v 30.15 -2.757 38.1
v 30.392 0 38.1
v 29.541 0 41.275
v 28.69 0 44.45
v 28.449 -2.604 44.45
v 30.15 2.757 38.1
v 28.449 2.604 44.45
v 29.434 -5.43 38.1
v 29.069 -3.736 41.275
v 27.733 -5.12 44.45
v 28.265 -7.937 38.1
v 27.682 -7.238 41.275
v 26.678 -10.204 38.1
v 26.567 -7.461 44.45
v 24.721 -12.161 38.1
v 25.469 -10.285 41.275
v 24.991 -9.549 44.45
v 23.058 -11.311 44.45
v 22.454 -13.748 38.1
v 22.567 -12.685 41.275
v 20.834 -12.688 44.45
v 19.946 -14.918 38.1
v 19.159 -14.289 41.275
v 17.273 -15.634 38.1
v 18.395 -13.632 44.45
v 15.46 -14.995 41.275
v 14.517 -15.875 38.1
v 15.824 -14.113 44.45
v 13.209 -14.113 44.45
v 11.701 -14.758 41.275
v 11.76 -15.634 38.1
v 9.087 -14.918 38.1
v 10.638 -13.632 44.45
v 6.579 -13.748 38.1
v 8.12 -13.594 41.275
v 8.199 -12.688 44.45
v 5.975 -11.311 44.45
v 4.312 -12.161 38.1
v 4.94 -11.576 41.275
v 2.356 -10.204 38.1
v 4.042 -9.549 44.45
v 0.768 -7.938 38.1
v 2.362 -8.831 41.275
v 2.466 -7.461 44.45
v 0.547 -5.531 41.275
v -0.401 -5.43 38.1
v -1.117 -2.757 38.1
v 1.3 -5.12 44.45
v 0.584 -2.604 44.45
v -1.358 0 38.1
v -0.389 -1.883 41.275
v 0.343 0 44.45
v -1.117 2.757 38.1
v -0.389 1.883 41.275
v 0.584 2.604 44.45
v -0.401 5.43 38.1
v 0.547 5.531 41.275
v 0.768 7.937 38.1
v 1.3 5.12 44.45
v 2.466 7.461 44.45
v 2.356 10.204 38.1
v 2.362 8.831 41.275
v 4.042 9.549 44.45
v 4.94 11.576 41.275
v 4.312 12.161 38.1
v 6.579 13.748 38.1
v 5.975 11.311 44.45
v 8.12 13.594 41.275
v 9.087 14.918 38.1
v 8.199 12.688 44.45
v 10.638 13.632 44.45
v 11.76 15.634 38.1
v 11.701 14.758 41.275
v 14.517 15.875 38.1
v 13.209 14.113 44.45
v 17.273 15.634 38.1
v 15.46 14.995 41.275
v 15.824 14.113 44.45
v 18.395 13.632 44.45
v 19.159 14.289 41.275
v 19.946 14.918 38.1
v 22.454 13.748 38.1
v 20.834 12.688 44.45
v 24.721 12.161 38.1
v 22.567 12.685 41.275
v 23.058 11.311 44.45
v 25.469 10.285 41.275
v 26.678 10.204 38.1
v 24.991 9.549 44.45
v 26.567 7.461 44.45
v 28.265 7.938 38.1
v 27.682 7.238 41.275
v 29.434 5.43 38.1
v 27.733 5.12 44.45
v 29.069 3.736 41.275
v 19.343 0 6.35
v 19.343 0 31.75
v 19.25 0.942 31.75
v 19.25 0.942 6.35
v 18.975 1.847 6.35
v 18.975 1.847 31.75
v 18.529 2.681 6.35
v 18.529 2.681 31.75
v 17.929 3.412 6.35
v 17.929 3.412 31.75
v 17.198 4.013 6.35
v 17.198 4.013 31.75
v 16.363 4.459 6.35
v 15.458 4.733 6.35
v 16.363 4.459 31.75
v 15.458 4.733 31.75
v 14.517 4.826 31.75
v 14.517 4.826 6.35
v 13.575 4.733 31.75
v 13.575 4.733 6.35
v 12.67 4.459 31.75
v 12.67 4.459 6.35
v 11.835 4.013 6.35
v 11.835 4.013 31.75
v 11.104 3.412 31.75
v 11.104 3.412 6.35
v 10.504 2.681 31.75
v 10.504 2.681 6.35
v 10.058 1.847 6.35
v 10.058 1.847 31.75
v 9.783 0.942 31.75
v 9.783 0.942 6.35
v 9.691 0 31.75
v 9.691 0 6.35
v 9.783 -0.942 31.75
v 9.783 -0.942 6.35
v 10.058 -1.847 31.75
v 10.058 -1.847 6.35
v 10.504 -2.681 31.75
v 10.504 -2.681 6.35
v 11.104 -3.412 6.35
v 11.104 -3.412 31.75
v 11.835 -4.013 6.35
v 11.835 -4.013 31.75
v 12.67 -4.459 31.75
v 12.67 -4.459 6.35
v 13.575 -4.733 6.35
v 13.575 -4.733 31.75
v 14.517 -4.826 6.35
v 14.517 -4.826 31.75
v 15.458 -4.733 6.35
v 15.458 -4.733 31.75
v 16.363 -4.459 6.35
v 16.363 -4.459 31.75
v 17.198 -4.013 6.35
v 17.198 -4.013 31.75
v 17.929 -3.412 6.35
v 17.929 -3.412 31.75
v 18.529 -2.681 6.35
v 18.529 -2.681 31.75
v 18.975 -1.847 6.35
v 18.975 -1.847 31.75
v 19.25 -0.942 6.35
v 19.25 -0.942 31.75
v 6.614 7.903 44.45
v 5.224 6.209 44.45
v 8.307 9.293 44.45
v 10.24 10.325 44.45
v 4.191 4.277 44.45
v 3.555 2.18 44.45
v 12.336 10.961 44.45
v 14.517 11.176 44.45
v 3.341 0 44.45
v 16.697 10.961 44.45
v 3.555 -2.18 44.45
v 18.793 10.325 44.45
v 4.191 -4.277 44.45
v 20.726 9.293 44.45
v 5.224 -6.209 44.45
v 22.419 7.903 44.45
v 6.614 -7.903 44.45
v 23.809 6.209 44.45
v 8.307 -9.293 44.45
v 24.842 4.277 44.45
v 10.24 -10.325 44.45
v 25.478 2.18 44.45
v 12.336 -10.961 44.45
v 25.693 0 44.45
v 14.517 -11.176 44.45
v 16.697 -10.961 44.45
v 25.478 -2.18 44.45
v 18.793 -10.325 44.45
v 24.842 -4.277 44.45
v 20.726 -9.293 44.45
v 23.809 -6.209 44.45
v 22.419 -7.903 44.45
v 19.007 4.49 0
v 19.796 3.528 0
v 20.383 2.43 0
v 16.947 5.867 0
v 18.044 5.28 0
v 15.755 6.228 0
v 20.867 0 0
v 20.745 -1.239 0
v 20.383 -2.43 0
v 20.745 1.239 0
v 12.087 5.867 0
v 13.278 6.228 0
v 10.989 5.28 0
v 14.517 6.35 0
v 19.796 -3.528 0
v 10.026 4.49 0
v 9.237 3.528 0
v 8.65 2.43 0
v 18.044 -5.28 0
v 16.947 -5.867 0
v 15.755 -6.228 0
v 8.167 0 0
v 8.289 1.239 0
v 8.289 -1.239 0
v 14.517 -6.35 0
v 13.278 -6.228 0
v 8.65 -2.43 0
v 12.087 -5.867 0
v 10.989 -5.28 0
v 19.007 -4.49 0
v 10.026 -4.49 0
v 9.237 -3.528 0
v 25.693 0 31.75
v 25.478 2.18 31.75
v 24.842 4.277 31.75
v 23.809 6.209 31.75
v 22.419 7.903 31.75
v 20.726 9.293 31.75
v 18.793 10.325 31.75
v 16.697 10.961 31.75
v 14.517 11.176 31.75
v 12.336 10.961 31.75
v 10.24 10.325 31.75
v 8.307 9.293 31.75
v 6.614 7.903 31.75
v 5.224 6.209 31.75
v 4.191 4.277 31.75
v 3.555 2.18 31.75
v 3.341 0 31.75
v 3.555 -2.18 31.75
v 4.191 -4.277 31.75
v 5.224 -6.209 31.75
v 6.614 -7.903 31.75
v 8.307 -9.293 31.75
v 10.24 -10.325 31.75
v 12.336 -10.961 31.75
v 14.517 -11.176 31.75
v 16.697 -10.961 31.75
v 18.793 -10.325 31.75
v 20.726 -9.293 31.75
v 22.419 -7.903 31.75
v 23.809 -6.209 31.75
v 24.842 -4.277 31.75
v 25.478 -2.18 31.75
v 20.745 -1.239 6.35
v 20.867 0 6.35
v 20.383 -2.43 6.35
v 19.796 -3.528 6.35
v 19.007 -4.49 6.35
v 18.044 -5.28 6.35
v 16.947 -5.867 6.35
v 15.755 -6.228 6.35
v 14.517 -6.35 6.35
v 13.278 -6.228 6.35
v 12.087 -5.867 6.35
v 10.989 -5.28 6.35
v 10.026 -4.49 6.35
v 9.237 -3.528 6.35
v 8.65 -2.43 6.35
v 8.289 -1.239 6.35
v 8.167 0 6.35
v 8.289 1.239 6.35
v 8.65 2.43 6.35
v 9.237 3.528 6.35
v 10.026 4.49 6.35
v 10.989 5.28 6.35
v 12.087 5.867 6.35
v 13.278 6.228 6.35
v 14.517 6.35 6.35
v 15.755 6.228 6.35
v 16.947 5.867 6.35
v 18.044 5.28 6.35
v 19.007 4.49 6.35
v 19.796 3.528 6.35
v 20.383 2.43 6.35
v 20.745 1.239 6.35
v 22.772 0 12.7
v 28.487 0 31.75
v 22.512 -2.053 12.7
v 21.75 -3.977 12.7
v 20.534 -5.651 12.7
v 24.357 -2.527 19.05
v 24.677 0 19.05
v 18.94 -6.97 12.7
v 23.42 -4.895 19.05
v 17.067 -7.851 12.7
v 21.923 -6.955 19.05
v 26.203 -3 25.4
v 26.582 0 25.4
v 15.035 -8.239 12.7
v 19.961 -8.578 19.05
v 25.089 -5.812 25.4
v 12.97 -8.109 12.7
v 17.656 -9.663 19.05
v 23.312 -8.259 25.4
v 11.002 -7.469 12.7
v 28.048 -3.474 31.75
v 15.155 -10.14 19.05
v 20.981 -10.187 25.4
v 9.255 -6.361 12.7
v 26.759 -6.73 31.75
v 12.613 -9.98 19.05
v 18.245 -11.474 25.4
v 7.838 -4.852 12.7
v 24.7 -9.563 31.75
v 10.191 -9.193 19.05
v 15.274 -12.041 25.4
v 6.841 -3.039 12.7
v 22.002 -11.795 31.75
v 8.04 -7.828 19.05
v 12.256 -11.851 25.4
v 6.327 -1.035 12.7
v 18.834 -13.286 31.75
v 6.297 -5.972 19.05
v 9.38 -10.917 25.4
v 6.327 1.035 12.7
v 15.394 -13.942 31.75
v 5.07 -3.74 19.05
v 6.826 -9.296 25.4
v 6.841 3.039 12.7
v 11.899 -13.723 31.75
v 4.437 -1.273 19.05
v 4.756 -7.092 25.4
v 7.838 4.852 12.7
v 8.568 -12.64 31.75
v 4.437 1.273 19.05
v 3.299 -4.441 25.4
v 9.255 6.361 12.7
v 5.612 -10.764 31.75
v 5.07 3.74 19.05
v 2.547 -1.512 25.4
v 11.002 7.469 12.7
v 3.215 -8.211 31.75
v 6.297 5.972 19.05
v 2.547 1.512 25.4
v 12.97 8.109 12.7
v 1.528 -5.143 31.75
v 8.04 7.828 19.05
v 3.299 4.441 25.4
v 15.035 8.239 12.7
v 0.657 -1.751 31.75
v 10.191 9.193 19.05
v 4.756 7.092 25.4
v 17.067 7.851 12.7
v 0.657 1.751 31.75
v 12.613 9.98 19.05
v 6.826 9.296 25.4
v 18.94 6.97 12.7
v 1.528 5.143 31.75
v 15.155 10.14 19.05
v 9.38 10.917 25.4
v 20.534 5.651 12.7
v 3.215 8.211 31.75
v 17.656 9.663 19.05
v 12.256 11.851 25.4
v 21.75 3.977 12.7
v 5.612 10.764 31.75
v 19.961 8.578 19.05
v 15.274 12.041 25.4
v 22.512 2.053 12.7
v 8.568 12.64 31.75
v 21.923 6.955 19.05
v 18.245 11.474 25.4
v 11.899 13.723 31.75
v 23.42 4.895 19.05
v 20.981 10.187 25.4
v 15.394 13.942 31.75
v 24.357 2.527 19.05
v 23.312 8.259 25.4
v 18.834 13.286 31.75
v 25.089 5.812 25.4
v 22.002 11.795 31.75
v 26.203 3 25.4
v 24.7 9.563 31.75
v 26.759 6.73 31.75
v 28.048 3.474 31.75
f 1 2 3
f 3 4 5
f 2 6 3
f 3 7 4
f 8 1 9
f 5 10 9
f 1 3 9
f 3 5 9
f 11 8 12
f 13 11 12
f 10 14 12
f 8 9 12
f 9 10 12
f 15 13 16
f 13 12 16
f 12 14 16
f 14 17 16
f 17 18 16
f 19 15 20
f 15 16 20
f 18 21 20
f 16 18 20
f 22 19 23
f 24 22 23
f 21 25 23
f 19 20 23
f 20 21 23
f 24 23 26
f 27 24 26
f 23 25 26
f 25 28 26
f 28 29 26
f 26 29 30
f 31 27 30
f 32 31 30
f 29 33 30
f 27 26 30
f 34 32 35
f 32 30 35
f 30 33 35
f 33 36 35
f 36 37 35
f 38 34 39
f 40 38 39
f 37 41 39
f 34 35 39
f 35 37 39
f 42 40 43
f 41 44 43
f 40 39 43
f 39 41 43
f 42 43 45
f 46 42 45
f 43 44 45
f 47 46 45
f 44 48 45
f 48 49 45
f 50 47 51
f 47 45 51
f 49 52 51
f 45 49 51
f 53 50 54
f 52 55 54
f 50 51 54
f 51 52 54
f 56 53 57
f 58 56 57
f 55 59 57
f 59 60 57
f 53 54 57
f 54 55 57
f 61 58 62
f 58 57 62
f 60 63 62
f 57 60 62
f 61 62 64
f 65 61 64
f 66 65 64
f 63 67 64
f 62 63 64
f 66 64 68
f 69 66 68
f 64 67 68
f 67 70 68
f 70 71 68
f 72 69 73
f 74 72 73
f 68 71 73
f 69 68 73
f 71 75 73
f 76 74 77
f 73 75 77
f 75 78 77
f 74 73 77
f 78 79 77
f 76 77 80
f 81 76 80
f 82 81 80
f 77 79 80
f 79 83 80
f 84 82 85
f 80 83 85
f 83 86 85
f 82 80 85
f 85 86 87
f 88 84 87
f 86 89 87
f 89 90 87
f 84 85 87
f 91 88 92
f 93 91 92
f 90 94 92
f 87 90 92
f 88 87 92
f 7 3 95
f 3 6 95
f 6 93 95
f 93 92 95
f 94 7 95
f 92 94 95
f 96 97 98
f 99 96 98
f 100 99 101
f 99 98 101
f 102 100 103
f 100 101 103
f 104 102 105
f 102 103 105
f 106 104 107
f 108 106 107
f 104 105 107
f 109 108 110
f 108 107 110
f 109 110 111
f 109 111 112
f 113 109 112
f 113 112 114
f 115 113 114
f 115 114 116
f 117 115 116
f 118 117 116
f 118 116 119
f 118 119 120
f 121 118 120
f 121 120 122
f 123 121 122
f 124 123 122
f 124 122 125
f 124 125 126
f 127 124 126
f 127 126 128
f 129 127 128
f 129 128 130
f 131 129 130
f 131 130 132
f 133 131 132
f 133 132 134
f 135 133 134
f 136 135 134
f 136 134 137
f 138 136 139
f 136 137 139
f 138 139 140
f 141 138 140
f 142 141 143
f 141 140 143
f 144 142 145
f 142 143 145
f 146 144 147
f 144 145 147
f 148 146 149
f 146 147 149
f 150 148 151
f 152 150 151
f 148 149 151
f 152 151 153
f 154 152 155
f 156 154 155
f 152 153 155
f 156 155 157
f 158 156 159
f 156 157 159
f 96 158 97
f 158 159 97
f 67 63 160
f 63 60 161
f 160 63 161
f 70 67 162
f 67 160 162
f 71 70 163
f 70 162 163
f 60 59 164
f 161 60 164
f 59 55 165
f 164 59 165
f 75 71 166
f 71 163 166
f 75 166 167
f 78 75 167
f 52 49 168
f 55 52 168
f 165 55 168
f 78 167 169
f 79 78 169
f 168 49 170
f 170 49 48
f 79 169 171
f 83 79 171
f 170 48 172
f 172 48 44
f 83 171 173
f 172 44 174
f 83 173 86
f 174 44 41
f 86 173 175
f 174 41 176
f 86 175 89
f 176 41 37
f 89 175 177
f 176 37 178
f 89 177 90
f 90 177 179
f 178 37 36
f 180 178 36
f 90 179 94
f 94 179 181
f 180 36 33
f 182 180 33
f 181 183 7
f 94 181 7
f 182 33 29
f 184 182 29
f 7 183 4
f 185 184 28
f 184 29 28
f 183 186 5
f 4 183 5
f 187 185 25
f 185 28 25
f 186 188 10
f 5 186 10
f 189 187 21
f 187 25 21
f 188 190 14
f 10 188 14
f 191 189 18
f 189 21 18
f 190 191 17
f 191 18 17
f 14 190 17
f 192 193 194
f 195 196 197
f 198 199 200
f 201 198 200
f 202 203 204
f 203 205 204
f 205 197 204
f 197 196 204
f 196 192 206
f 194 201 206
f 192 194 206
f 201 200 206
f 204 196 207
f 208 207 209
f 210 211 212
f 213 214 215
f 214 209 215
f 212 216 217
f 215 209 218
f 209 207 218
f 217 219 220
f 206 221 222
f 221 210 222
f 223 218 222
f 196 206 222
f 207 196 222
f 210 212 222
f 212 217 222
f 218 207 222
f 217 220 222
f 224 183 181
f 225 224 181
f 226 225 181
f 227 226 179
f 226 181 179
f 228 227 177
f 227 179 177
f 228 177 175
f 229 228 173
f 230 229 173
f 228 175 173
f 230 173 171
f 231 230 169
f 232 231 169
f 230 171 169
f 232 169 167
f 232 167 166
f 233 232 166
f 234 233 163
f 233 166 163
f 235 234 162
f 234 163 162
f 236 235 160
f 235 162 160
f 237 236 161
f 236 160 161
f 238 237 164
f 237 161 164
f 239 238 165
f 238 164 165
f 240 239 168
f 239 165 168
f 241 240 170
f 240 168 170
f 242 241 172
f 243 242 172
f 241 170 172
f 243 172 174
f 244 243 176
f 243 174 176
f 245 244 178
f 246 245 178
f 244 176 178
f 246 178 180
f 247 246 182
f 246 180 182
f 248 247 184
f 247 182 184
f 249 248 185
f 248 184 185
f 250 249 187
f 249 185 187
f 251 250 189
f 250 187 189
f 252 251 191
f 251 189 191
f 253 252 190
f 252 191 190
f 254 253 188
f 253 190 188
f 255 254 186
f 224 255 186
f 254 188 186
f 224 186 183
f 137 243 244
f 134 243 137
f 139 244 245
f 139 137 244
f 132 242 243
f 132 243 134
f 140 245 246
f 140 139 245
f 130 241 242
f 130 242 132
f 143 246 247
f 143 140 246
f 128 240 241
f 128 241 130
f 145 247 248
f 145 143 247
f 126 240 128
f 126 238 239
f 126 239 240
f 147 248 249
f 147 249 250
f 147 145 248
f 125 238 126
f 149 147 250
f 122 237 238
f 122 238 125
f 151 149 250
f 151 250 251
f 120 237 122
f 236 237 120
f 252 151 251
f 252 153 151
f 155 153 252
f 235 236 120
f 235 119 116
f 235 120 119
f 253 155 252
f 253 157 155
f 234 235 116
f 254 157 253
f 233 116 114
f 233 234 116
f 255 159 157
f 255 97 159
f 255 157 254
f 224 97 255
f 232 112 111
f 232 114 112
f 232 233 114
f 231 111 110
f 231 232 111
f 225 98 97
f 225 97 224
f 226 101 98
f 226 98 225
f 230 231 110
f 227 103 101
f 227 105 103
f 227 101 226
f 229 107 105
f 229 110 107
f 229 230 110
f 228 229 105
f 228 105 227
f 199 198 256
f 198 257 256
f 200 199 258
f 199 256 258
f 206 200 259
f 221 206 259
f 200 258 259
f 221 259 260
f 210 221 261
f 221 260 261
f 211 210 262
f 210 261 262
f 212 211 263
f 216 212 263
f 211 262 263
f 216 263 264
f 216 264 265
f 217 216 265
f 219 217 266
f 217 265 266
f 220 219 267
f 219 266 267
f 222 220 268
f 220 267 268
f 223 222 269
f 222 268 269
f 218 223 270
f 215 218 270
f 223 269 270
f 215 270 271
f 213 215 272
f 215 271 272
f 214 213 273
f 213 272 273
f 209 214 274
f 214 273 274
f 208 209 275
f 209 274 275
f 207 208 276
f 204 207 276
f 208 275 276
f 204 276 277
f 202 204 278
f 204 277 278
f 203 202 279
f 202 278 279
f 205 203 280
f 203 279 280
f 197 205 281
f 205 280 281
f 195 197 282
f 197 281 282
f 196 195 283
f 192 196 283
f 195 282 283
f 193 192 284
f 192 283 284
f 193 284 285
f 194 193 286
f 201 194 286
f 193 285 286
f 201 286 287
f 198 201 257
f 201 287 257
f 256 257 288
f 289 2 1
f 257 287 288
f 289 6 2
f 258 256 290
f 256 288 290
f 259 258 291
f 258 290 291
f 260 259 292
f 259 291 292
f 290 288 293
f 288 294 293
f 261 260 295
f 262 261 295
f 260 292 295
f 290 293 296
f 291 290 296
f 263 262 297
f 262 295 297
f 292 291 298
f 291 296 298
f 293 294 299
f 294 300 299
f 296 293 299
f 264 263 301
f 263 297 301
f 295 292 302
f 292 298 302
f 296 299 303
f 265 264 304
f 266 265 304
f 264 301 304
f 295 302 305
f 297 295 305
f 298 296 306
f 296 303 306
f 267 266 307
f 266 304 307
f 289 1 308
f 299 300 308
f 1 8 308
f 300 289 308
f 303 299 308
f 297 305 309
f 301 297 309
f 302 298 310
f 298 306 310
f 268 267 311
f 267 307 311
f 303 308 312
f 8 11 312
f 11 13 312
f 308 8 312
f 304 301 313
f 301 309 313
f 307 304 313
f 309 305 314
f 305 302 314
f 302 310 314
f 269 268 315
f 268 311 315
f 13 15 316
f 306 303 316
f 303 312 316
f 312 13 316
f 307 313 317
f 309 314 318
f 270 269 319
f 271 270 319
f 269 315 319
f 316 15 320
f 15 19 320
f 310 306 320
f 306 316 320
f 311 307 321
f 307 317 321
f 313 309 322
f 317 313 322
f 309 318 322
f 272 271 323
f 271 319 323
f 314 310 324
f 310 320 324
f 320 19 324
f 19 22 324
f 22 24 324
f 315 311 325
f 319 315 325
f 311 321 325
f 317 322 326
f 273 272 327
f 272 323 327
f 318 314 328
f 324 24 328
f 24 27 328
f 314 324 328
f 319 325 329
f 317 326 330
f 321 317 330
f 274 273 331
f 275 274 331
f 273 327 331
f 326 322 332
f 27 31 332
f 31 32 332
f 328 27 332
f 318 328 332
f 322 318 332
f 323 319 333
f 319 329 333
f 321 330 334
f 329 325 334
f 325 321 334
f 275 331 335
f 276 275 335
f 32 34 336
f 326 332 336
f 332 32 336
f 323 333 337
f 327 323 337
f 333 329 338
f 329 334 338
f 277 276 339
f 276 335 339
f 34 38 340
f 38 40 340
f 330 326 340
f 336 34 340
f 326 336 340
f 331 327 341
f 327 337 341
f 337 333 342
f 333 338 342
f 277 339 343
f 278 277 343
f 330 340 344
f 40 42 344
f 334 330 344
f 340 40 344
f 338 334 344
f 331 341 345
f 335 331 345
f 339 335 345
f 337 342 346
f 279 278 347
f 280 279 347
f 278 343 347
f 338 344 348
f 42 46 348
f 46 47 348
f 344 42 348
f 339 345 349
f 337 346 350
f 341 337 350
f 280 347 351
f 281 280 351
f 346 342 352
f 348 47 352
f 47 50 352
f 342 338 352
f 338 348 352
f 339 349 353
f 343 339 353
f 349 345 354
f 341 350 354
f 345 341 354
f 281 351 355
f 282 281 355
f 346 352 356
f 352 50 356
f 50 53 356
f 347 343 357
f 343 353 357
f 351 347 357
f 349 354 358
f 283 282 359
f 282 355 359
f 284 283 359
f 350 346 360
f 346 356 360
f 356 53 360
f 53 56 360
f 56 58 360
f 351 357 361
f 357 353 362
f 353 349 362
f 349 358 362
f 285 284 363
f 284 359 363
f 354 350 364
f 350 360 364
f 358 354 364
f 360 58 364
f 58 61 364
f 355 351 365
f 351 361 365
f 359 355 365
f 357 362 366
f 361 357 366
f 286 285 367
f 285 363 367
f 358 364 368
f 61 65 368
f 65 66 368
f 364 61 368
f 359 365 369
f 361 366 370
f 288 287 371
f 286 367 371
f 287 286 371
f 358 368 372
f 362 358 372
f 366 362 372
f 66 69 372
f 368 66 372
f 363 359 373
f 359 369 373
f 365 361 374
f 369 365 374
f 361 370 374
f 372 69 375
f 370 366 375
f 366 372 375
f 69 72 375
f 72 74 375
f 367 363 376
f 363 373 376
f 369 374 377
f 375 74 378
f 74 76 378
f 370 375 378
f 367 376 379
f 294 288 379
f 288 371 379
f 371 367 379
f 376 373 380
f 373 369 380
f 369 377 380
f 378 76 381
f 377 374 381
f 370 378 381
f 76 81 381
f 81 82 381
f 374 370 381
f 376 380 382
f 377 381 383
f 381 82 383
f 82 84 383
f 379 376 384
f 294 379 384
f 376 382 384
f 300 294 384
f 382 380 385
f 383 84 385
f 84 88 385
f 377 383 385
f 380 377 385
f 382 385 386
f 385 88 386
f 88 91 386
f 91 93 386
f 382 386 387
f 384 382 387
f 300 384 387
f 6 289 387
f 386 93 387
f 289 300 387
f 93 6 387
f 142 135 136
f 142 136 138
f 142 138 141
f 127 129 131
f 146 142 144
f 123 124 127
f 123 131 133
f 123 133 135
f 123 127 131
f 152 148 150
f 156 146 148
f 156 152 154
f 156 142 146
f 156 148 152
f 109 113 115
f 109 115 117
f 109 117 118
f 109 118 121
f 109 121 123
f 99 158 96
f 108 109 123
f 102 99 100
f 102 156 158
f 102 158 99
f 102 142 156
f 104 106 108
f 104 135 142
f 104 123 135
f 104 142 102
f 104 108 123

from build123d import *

# Parameters (mm, degrees)
F2_R     = 4.826
F3_DEPTH = 38.1
F2_R_2   = 11.176
F4_DEPTH = 12.7


with BuildPart() as f1:
    # F0 (on Front) → F1 (revolve)
    with BuildSketch(Plane.XZ):
        Polygon((14.516552, 44.45), (14.516552, 0), (20.866552, 0), (20.866552, 6.35), (30.391552, 38.1), (28.690075, 44.45), align=None)
    revolve(axis=Axis((14.516552, 0, 22.225), (0, 0, -1)))

    # F2 (on face) → F3 (cut)
    with BuildSketch(Plane.XY.offset(44.45)):
        with Locations((14.516552, 0)):
            Circle(F2_R)
    extrude(amount=-F3_DEPTH, mode=Mode.SUBTRACT)

    # F2 (on face) → F4 (cut)
    with BuildSketch(Plane.XY.offset(44.45)):
        with Locations((14.516552, 0)):
            Circle(F2_R_2)
        with Locations((14.516552, 0)):
            Circle(F2_R, mode=Mode.SUBTRACT)
    extrude(amount=-F4_DEPTH, mode=Mode.SUBTRACT)


solid = f1.part
